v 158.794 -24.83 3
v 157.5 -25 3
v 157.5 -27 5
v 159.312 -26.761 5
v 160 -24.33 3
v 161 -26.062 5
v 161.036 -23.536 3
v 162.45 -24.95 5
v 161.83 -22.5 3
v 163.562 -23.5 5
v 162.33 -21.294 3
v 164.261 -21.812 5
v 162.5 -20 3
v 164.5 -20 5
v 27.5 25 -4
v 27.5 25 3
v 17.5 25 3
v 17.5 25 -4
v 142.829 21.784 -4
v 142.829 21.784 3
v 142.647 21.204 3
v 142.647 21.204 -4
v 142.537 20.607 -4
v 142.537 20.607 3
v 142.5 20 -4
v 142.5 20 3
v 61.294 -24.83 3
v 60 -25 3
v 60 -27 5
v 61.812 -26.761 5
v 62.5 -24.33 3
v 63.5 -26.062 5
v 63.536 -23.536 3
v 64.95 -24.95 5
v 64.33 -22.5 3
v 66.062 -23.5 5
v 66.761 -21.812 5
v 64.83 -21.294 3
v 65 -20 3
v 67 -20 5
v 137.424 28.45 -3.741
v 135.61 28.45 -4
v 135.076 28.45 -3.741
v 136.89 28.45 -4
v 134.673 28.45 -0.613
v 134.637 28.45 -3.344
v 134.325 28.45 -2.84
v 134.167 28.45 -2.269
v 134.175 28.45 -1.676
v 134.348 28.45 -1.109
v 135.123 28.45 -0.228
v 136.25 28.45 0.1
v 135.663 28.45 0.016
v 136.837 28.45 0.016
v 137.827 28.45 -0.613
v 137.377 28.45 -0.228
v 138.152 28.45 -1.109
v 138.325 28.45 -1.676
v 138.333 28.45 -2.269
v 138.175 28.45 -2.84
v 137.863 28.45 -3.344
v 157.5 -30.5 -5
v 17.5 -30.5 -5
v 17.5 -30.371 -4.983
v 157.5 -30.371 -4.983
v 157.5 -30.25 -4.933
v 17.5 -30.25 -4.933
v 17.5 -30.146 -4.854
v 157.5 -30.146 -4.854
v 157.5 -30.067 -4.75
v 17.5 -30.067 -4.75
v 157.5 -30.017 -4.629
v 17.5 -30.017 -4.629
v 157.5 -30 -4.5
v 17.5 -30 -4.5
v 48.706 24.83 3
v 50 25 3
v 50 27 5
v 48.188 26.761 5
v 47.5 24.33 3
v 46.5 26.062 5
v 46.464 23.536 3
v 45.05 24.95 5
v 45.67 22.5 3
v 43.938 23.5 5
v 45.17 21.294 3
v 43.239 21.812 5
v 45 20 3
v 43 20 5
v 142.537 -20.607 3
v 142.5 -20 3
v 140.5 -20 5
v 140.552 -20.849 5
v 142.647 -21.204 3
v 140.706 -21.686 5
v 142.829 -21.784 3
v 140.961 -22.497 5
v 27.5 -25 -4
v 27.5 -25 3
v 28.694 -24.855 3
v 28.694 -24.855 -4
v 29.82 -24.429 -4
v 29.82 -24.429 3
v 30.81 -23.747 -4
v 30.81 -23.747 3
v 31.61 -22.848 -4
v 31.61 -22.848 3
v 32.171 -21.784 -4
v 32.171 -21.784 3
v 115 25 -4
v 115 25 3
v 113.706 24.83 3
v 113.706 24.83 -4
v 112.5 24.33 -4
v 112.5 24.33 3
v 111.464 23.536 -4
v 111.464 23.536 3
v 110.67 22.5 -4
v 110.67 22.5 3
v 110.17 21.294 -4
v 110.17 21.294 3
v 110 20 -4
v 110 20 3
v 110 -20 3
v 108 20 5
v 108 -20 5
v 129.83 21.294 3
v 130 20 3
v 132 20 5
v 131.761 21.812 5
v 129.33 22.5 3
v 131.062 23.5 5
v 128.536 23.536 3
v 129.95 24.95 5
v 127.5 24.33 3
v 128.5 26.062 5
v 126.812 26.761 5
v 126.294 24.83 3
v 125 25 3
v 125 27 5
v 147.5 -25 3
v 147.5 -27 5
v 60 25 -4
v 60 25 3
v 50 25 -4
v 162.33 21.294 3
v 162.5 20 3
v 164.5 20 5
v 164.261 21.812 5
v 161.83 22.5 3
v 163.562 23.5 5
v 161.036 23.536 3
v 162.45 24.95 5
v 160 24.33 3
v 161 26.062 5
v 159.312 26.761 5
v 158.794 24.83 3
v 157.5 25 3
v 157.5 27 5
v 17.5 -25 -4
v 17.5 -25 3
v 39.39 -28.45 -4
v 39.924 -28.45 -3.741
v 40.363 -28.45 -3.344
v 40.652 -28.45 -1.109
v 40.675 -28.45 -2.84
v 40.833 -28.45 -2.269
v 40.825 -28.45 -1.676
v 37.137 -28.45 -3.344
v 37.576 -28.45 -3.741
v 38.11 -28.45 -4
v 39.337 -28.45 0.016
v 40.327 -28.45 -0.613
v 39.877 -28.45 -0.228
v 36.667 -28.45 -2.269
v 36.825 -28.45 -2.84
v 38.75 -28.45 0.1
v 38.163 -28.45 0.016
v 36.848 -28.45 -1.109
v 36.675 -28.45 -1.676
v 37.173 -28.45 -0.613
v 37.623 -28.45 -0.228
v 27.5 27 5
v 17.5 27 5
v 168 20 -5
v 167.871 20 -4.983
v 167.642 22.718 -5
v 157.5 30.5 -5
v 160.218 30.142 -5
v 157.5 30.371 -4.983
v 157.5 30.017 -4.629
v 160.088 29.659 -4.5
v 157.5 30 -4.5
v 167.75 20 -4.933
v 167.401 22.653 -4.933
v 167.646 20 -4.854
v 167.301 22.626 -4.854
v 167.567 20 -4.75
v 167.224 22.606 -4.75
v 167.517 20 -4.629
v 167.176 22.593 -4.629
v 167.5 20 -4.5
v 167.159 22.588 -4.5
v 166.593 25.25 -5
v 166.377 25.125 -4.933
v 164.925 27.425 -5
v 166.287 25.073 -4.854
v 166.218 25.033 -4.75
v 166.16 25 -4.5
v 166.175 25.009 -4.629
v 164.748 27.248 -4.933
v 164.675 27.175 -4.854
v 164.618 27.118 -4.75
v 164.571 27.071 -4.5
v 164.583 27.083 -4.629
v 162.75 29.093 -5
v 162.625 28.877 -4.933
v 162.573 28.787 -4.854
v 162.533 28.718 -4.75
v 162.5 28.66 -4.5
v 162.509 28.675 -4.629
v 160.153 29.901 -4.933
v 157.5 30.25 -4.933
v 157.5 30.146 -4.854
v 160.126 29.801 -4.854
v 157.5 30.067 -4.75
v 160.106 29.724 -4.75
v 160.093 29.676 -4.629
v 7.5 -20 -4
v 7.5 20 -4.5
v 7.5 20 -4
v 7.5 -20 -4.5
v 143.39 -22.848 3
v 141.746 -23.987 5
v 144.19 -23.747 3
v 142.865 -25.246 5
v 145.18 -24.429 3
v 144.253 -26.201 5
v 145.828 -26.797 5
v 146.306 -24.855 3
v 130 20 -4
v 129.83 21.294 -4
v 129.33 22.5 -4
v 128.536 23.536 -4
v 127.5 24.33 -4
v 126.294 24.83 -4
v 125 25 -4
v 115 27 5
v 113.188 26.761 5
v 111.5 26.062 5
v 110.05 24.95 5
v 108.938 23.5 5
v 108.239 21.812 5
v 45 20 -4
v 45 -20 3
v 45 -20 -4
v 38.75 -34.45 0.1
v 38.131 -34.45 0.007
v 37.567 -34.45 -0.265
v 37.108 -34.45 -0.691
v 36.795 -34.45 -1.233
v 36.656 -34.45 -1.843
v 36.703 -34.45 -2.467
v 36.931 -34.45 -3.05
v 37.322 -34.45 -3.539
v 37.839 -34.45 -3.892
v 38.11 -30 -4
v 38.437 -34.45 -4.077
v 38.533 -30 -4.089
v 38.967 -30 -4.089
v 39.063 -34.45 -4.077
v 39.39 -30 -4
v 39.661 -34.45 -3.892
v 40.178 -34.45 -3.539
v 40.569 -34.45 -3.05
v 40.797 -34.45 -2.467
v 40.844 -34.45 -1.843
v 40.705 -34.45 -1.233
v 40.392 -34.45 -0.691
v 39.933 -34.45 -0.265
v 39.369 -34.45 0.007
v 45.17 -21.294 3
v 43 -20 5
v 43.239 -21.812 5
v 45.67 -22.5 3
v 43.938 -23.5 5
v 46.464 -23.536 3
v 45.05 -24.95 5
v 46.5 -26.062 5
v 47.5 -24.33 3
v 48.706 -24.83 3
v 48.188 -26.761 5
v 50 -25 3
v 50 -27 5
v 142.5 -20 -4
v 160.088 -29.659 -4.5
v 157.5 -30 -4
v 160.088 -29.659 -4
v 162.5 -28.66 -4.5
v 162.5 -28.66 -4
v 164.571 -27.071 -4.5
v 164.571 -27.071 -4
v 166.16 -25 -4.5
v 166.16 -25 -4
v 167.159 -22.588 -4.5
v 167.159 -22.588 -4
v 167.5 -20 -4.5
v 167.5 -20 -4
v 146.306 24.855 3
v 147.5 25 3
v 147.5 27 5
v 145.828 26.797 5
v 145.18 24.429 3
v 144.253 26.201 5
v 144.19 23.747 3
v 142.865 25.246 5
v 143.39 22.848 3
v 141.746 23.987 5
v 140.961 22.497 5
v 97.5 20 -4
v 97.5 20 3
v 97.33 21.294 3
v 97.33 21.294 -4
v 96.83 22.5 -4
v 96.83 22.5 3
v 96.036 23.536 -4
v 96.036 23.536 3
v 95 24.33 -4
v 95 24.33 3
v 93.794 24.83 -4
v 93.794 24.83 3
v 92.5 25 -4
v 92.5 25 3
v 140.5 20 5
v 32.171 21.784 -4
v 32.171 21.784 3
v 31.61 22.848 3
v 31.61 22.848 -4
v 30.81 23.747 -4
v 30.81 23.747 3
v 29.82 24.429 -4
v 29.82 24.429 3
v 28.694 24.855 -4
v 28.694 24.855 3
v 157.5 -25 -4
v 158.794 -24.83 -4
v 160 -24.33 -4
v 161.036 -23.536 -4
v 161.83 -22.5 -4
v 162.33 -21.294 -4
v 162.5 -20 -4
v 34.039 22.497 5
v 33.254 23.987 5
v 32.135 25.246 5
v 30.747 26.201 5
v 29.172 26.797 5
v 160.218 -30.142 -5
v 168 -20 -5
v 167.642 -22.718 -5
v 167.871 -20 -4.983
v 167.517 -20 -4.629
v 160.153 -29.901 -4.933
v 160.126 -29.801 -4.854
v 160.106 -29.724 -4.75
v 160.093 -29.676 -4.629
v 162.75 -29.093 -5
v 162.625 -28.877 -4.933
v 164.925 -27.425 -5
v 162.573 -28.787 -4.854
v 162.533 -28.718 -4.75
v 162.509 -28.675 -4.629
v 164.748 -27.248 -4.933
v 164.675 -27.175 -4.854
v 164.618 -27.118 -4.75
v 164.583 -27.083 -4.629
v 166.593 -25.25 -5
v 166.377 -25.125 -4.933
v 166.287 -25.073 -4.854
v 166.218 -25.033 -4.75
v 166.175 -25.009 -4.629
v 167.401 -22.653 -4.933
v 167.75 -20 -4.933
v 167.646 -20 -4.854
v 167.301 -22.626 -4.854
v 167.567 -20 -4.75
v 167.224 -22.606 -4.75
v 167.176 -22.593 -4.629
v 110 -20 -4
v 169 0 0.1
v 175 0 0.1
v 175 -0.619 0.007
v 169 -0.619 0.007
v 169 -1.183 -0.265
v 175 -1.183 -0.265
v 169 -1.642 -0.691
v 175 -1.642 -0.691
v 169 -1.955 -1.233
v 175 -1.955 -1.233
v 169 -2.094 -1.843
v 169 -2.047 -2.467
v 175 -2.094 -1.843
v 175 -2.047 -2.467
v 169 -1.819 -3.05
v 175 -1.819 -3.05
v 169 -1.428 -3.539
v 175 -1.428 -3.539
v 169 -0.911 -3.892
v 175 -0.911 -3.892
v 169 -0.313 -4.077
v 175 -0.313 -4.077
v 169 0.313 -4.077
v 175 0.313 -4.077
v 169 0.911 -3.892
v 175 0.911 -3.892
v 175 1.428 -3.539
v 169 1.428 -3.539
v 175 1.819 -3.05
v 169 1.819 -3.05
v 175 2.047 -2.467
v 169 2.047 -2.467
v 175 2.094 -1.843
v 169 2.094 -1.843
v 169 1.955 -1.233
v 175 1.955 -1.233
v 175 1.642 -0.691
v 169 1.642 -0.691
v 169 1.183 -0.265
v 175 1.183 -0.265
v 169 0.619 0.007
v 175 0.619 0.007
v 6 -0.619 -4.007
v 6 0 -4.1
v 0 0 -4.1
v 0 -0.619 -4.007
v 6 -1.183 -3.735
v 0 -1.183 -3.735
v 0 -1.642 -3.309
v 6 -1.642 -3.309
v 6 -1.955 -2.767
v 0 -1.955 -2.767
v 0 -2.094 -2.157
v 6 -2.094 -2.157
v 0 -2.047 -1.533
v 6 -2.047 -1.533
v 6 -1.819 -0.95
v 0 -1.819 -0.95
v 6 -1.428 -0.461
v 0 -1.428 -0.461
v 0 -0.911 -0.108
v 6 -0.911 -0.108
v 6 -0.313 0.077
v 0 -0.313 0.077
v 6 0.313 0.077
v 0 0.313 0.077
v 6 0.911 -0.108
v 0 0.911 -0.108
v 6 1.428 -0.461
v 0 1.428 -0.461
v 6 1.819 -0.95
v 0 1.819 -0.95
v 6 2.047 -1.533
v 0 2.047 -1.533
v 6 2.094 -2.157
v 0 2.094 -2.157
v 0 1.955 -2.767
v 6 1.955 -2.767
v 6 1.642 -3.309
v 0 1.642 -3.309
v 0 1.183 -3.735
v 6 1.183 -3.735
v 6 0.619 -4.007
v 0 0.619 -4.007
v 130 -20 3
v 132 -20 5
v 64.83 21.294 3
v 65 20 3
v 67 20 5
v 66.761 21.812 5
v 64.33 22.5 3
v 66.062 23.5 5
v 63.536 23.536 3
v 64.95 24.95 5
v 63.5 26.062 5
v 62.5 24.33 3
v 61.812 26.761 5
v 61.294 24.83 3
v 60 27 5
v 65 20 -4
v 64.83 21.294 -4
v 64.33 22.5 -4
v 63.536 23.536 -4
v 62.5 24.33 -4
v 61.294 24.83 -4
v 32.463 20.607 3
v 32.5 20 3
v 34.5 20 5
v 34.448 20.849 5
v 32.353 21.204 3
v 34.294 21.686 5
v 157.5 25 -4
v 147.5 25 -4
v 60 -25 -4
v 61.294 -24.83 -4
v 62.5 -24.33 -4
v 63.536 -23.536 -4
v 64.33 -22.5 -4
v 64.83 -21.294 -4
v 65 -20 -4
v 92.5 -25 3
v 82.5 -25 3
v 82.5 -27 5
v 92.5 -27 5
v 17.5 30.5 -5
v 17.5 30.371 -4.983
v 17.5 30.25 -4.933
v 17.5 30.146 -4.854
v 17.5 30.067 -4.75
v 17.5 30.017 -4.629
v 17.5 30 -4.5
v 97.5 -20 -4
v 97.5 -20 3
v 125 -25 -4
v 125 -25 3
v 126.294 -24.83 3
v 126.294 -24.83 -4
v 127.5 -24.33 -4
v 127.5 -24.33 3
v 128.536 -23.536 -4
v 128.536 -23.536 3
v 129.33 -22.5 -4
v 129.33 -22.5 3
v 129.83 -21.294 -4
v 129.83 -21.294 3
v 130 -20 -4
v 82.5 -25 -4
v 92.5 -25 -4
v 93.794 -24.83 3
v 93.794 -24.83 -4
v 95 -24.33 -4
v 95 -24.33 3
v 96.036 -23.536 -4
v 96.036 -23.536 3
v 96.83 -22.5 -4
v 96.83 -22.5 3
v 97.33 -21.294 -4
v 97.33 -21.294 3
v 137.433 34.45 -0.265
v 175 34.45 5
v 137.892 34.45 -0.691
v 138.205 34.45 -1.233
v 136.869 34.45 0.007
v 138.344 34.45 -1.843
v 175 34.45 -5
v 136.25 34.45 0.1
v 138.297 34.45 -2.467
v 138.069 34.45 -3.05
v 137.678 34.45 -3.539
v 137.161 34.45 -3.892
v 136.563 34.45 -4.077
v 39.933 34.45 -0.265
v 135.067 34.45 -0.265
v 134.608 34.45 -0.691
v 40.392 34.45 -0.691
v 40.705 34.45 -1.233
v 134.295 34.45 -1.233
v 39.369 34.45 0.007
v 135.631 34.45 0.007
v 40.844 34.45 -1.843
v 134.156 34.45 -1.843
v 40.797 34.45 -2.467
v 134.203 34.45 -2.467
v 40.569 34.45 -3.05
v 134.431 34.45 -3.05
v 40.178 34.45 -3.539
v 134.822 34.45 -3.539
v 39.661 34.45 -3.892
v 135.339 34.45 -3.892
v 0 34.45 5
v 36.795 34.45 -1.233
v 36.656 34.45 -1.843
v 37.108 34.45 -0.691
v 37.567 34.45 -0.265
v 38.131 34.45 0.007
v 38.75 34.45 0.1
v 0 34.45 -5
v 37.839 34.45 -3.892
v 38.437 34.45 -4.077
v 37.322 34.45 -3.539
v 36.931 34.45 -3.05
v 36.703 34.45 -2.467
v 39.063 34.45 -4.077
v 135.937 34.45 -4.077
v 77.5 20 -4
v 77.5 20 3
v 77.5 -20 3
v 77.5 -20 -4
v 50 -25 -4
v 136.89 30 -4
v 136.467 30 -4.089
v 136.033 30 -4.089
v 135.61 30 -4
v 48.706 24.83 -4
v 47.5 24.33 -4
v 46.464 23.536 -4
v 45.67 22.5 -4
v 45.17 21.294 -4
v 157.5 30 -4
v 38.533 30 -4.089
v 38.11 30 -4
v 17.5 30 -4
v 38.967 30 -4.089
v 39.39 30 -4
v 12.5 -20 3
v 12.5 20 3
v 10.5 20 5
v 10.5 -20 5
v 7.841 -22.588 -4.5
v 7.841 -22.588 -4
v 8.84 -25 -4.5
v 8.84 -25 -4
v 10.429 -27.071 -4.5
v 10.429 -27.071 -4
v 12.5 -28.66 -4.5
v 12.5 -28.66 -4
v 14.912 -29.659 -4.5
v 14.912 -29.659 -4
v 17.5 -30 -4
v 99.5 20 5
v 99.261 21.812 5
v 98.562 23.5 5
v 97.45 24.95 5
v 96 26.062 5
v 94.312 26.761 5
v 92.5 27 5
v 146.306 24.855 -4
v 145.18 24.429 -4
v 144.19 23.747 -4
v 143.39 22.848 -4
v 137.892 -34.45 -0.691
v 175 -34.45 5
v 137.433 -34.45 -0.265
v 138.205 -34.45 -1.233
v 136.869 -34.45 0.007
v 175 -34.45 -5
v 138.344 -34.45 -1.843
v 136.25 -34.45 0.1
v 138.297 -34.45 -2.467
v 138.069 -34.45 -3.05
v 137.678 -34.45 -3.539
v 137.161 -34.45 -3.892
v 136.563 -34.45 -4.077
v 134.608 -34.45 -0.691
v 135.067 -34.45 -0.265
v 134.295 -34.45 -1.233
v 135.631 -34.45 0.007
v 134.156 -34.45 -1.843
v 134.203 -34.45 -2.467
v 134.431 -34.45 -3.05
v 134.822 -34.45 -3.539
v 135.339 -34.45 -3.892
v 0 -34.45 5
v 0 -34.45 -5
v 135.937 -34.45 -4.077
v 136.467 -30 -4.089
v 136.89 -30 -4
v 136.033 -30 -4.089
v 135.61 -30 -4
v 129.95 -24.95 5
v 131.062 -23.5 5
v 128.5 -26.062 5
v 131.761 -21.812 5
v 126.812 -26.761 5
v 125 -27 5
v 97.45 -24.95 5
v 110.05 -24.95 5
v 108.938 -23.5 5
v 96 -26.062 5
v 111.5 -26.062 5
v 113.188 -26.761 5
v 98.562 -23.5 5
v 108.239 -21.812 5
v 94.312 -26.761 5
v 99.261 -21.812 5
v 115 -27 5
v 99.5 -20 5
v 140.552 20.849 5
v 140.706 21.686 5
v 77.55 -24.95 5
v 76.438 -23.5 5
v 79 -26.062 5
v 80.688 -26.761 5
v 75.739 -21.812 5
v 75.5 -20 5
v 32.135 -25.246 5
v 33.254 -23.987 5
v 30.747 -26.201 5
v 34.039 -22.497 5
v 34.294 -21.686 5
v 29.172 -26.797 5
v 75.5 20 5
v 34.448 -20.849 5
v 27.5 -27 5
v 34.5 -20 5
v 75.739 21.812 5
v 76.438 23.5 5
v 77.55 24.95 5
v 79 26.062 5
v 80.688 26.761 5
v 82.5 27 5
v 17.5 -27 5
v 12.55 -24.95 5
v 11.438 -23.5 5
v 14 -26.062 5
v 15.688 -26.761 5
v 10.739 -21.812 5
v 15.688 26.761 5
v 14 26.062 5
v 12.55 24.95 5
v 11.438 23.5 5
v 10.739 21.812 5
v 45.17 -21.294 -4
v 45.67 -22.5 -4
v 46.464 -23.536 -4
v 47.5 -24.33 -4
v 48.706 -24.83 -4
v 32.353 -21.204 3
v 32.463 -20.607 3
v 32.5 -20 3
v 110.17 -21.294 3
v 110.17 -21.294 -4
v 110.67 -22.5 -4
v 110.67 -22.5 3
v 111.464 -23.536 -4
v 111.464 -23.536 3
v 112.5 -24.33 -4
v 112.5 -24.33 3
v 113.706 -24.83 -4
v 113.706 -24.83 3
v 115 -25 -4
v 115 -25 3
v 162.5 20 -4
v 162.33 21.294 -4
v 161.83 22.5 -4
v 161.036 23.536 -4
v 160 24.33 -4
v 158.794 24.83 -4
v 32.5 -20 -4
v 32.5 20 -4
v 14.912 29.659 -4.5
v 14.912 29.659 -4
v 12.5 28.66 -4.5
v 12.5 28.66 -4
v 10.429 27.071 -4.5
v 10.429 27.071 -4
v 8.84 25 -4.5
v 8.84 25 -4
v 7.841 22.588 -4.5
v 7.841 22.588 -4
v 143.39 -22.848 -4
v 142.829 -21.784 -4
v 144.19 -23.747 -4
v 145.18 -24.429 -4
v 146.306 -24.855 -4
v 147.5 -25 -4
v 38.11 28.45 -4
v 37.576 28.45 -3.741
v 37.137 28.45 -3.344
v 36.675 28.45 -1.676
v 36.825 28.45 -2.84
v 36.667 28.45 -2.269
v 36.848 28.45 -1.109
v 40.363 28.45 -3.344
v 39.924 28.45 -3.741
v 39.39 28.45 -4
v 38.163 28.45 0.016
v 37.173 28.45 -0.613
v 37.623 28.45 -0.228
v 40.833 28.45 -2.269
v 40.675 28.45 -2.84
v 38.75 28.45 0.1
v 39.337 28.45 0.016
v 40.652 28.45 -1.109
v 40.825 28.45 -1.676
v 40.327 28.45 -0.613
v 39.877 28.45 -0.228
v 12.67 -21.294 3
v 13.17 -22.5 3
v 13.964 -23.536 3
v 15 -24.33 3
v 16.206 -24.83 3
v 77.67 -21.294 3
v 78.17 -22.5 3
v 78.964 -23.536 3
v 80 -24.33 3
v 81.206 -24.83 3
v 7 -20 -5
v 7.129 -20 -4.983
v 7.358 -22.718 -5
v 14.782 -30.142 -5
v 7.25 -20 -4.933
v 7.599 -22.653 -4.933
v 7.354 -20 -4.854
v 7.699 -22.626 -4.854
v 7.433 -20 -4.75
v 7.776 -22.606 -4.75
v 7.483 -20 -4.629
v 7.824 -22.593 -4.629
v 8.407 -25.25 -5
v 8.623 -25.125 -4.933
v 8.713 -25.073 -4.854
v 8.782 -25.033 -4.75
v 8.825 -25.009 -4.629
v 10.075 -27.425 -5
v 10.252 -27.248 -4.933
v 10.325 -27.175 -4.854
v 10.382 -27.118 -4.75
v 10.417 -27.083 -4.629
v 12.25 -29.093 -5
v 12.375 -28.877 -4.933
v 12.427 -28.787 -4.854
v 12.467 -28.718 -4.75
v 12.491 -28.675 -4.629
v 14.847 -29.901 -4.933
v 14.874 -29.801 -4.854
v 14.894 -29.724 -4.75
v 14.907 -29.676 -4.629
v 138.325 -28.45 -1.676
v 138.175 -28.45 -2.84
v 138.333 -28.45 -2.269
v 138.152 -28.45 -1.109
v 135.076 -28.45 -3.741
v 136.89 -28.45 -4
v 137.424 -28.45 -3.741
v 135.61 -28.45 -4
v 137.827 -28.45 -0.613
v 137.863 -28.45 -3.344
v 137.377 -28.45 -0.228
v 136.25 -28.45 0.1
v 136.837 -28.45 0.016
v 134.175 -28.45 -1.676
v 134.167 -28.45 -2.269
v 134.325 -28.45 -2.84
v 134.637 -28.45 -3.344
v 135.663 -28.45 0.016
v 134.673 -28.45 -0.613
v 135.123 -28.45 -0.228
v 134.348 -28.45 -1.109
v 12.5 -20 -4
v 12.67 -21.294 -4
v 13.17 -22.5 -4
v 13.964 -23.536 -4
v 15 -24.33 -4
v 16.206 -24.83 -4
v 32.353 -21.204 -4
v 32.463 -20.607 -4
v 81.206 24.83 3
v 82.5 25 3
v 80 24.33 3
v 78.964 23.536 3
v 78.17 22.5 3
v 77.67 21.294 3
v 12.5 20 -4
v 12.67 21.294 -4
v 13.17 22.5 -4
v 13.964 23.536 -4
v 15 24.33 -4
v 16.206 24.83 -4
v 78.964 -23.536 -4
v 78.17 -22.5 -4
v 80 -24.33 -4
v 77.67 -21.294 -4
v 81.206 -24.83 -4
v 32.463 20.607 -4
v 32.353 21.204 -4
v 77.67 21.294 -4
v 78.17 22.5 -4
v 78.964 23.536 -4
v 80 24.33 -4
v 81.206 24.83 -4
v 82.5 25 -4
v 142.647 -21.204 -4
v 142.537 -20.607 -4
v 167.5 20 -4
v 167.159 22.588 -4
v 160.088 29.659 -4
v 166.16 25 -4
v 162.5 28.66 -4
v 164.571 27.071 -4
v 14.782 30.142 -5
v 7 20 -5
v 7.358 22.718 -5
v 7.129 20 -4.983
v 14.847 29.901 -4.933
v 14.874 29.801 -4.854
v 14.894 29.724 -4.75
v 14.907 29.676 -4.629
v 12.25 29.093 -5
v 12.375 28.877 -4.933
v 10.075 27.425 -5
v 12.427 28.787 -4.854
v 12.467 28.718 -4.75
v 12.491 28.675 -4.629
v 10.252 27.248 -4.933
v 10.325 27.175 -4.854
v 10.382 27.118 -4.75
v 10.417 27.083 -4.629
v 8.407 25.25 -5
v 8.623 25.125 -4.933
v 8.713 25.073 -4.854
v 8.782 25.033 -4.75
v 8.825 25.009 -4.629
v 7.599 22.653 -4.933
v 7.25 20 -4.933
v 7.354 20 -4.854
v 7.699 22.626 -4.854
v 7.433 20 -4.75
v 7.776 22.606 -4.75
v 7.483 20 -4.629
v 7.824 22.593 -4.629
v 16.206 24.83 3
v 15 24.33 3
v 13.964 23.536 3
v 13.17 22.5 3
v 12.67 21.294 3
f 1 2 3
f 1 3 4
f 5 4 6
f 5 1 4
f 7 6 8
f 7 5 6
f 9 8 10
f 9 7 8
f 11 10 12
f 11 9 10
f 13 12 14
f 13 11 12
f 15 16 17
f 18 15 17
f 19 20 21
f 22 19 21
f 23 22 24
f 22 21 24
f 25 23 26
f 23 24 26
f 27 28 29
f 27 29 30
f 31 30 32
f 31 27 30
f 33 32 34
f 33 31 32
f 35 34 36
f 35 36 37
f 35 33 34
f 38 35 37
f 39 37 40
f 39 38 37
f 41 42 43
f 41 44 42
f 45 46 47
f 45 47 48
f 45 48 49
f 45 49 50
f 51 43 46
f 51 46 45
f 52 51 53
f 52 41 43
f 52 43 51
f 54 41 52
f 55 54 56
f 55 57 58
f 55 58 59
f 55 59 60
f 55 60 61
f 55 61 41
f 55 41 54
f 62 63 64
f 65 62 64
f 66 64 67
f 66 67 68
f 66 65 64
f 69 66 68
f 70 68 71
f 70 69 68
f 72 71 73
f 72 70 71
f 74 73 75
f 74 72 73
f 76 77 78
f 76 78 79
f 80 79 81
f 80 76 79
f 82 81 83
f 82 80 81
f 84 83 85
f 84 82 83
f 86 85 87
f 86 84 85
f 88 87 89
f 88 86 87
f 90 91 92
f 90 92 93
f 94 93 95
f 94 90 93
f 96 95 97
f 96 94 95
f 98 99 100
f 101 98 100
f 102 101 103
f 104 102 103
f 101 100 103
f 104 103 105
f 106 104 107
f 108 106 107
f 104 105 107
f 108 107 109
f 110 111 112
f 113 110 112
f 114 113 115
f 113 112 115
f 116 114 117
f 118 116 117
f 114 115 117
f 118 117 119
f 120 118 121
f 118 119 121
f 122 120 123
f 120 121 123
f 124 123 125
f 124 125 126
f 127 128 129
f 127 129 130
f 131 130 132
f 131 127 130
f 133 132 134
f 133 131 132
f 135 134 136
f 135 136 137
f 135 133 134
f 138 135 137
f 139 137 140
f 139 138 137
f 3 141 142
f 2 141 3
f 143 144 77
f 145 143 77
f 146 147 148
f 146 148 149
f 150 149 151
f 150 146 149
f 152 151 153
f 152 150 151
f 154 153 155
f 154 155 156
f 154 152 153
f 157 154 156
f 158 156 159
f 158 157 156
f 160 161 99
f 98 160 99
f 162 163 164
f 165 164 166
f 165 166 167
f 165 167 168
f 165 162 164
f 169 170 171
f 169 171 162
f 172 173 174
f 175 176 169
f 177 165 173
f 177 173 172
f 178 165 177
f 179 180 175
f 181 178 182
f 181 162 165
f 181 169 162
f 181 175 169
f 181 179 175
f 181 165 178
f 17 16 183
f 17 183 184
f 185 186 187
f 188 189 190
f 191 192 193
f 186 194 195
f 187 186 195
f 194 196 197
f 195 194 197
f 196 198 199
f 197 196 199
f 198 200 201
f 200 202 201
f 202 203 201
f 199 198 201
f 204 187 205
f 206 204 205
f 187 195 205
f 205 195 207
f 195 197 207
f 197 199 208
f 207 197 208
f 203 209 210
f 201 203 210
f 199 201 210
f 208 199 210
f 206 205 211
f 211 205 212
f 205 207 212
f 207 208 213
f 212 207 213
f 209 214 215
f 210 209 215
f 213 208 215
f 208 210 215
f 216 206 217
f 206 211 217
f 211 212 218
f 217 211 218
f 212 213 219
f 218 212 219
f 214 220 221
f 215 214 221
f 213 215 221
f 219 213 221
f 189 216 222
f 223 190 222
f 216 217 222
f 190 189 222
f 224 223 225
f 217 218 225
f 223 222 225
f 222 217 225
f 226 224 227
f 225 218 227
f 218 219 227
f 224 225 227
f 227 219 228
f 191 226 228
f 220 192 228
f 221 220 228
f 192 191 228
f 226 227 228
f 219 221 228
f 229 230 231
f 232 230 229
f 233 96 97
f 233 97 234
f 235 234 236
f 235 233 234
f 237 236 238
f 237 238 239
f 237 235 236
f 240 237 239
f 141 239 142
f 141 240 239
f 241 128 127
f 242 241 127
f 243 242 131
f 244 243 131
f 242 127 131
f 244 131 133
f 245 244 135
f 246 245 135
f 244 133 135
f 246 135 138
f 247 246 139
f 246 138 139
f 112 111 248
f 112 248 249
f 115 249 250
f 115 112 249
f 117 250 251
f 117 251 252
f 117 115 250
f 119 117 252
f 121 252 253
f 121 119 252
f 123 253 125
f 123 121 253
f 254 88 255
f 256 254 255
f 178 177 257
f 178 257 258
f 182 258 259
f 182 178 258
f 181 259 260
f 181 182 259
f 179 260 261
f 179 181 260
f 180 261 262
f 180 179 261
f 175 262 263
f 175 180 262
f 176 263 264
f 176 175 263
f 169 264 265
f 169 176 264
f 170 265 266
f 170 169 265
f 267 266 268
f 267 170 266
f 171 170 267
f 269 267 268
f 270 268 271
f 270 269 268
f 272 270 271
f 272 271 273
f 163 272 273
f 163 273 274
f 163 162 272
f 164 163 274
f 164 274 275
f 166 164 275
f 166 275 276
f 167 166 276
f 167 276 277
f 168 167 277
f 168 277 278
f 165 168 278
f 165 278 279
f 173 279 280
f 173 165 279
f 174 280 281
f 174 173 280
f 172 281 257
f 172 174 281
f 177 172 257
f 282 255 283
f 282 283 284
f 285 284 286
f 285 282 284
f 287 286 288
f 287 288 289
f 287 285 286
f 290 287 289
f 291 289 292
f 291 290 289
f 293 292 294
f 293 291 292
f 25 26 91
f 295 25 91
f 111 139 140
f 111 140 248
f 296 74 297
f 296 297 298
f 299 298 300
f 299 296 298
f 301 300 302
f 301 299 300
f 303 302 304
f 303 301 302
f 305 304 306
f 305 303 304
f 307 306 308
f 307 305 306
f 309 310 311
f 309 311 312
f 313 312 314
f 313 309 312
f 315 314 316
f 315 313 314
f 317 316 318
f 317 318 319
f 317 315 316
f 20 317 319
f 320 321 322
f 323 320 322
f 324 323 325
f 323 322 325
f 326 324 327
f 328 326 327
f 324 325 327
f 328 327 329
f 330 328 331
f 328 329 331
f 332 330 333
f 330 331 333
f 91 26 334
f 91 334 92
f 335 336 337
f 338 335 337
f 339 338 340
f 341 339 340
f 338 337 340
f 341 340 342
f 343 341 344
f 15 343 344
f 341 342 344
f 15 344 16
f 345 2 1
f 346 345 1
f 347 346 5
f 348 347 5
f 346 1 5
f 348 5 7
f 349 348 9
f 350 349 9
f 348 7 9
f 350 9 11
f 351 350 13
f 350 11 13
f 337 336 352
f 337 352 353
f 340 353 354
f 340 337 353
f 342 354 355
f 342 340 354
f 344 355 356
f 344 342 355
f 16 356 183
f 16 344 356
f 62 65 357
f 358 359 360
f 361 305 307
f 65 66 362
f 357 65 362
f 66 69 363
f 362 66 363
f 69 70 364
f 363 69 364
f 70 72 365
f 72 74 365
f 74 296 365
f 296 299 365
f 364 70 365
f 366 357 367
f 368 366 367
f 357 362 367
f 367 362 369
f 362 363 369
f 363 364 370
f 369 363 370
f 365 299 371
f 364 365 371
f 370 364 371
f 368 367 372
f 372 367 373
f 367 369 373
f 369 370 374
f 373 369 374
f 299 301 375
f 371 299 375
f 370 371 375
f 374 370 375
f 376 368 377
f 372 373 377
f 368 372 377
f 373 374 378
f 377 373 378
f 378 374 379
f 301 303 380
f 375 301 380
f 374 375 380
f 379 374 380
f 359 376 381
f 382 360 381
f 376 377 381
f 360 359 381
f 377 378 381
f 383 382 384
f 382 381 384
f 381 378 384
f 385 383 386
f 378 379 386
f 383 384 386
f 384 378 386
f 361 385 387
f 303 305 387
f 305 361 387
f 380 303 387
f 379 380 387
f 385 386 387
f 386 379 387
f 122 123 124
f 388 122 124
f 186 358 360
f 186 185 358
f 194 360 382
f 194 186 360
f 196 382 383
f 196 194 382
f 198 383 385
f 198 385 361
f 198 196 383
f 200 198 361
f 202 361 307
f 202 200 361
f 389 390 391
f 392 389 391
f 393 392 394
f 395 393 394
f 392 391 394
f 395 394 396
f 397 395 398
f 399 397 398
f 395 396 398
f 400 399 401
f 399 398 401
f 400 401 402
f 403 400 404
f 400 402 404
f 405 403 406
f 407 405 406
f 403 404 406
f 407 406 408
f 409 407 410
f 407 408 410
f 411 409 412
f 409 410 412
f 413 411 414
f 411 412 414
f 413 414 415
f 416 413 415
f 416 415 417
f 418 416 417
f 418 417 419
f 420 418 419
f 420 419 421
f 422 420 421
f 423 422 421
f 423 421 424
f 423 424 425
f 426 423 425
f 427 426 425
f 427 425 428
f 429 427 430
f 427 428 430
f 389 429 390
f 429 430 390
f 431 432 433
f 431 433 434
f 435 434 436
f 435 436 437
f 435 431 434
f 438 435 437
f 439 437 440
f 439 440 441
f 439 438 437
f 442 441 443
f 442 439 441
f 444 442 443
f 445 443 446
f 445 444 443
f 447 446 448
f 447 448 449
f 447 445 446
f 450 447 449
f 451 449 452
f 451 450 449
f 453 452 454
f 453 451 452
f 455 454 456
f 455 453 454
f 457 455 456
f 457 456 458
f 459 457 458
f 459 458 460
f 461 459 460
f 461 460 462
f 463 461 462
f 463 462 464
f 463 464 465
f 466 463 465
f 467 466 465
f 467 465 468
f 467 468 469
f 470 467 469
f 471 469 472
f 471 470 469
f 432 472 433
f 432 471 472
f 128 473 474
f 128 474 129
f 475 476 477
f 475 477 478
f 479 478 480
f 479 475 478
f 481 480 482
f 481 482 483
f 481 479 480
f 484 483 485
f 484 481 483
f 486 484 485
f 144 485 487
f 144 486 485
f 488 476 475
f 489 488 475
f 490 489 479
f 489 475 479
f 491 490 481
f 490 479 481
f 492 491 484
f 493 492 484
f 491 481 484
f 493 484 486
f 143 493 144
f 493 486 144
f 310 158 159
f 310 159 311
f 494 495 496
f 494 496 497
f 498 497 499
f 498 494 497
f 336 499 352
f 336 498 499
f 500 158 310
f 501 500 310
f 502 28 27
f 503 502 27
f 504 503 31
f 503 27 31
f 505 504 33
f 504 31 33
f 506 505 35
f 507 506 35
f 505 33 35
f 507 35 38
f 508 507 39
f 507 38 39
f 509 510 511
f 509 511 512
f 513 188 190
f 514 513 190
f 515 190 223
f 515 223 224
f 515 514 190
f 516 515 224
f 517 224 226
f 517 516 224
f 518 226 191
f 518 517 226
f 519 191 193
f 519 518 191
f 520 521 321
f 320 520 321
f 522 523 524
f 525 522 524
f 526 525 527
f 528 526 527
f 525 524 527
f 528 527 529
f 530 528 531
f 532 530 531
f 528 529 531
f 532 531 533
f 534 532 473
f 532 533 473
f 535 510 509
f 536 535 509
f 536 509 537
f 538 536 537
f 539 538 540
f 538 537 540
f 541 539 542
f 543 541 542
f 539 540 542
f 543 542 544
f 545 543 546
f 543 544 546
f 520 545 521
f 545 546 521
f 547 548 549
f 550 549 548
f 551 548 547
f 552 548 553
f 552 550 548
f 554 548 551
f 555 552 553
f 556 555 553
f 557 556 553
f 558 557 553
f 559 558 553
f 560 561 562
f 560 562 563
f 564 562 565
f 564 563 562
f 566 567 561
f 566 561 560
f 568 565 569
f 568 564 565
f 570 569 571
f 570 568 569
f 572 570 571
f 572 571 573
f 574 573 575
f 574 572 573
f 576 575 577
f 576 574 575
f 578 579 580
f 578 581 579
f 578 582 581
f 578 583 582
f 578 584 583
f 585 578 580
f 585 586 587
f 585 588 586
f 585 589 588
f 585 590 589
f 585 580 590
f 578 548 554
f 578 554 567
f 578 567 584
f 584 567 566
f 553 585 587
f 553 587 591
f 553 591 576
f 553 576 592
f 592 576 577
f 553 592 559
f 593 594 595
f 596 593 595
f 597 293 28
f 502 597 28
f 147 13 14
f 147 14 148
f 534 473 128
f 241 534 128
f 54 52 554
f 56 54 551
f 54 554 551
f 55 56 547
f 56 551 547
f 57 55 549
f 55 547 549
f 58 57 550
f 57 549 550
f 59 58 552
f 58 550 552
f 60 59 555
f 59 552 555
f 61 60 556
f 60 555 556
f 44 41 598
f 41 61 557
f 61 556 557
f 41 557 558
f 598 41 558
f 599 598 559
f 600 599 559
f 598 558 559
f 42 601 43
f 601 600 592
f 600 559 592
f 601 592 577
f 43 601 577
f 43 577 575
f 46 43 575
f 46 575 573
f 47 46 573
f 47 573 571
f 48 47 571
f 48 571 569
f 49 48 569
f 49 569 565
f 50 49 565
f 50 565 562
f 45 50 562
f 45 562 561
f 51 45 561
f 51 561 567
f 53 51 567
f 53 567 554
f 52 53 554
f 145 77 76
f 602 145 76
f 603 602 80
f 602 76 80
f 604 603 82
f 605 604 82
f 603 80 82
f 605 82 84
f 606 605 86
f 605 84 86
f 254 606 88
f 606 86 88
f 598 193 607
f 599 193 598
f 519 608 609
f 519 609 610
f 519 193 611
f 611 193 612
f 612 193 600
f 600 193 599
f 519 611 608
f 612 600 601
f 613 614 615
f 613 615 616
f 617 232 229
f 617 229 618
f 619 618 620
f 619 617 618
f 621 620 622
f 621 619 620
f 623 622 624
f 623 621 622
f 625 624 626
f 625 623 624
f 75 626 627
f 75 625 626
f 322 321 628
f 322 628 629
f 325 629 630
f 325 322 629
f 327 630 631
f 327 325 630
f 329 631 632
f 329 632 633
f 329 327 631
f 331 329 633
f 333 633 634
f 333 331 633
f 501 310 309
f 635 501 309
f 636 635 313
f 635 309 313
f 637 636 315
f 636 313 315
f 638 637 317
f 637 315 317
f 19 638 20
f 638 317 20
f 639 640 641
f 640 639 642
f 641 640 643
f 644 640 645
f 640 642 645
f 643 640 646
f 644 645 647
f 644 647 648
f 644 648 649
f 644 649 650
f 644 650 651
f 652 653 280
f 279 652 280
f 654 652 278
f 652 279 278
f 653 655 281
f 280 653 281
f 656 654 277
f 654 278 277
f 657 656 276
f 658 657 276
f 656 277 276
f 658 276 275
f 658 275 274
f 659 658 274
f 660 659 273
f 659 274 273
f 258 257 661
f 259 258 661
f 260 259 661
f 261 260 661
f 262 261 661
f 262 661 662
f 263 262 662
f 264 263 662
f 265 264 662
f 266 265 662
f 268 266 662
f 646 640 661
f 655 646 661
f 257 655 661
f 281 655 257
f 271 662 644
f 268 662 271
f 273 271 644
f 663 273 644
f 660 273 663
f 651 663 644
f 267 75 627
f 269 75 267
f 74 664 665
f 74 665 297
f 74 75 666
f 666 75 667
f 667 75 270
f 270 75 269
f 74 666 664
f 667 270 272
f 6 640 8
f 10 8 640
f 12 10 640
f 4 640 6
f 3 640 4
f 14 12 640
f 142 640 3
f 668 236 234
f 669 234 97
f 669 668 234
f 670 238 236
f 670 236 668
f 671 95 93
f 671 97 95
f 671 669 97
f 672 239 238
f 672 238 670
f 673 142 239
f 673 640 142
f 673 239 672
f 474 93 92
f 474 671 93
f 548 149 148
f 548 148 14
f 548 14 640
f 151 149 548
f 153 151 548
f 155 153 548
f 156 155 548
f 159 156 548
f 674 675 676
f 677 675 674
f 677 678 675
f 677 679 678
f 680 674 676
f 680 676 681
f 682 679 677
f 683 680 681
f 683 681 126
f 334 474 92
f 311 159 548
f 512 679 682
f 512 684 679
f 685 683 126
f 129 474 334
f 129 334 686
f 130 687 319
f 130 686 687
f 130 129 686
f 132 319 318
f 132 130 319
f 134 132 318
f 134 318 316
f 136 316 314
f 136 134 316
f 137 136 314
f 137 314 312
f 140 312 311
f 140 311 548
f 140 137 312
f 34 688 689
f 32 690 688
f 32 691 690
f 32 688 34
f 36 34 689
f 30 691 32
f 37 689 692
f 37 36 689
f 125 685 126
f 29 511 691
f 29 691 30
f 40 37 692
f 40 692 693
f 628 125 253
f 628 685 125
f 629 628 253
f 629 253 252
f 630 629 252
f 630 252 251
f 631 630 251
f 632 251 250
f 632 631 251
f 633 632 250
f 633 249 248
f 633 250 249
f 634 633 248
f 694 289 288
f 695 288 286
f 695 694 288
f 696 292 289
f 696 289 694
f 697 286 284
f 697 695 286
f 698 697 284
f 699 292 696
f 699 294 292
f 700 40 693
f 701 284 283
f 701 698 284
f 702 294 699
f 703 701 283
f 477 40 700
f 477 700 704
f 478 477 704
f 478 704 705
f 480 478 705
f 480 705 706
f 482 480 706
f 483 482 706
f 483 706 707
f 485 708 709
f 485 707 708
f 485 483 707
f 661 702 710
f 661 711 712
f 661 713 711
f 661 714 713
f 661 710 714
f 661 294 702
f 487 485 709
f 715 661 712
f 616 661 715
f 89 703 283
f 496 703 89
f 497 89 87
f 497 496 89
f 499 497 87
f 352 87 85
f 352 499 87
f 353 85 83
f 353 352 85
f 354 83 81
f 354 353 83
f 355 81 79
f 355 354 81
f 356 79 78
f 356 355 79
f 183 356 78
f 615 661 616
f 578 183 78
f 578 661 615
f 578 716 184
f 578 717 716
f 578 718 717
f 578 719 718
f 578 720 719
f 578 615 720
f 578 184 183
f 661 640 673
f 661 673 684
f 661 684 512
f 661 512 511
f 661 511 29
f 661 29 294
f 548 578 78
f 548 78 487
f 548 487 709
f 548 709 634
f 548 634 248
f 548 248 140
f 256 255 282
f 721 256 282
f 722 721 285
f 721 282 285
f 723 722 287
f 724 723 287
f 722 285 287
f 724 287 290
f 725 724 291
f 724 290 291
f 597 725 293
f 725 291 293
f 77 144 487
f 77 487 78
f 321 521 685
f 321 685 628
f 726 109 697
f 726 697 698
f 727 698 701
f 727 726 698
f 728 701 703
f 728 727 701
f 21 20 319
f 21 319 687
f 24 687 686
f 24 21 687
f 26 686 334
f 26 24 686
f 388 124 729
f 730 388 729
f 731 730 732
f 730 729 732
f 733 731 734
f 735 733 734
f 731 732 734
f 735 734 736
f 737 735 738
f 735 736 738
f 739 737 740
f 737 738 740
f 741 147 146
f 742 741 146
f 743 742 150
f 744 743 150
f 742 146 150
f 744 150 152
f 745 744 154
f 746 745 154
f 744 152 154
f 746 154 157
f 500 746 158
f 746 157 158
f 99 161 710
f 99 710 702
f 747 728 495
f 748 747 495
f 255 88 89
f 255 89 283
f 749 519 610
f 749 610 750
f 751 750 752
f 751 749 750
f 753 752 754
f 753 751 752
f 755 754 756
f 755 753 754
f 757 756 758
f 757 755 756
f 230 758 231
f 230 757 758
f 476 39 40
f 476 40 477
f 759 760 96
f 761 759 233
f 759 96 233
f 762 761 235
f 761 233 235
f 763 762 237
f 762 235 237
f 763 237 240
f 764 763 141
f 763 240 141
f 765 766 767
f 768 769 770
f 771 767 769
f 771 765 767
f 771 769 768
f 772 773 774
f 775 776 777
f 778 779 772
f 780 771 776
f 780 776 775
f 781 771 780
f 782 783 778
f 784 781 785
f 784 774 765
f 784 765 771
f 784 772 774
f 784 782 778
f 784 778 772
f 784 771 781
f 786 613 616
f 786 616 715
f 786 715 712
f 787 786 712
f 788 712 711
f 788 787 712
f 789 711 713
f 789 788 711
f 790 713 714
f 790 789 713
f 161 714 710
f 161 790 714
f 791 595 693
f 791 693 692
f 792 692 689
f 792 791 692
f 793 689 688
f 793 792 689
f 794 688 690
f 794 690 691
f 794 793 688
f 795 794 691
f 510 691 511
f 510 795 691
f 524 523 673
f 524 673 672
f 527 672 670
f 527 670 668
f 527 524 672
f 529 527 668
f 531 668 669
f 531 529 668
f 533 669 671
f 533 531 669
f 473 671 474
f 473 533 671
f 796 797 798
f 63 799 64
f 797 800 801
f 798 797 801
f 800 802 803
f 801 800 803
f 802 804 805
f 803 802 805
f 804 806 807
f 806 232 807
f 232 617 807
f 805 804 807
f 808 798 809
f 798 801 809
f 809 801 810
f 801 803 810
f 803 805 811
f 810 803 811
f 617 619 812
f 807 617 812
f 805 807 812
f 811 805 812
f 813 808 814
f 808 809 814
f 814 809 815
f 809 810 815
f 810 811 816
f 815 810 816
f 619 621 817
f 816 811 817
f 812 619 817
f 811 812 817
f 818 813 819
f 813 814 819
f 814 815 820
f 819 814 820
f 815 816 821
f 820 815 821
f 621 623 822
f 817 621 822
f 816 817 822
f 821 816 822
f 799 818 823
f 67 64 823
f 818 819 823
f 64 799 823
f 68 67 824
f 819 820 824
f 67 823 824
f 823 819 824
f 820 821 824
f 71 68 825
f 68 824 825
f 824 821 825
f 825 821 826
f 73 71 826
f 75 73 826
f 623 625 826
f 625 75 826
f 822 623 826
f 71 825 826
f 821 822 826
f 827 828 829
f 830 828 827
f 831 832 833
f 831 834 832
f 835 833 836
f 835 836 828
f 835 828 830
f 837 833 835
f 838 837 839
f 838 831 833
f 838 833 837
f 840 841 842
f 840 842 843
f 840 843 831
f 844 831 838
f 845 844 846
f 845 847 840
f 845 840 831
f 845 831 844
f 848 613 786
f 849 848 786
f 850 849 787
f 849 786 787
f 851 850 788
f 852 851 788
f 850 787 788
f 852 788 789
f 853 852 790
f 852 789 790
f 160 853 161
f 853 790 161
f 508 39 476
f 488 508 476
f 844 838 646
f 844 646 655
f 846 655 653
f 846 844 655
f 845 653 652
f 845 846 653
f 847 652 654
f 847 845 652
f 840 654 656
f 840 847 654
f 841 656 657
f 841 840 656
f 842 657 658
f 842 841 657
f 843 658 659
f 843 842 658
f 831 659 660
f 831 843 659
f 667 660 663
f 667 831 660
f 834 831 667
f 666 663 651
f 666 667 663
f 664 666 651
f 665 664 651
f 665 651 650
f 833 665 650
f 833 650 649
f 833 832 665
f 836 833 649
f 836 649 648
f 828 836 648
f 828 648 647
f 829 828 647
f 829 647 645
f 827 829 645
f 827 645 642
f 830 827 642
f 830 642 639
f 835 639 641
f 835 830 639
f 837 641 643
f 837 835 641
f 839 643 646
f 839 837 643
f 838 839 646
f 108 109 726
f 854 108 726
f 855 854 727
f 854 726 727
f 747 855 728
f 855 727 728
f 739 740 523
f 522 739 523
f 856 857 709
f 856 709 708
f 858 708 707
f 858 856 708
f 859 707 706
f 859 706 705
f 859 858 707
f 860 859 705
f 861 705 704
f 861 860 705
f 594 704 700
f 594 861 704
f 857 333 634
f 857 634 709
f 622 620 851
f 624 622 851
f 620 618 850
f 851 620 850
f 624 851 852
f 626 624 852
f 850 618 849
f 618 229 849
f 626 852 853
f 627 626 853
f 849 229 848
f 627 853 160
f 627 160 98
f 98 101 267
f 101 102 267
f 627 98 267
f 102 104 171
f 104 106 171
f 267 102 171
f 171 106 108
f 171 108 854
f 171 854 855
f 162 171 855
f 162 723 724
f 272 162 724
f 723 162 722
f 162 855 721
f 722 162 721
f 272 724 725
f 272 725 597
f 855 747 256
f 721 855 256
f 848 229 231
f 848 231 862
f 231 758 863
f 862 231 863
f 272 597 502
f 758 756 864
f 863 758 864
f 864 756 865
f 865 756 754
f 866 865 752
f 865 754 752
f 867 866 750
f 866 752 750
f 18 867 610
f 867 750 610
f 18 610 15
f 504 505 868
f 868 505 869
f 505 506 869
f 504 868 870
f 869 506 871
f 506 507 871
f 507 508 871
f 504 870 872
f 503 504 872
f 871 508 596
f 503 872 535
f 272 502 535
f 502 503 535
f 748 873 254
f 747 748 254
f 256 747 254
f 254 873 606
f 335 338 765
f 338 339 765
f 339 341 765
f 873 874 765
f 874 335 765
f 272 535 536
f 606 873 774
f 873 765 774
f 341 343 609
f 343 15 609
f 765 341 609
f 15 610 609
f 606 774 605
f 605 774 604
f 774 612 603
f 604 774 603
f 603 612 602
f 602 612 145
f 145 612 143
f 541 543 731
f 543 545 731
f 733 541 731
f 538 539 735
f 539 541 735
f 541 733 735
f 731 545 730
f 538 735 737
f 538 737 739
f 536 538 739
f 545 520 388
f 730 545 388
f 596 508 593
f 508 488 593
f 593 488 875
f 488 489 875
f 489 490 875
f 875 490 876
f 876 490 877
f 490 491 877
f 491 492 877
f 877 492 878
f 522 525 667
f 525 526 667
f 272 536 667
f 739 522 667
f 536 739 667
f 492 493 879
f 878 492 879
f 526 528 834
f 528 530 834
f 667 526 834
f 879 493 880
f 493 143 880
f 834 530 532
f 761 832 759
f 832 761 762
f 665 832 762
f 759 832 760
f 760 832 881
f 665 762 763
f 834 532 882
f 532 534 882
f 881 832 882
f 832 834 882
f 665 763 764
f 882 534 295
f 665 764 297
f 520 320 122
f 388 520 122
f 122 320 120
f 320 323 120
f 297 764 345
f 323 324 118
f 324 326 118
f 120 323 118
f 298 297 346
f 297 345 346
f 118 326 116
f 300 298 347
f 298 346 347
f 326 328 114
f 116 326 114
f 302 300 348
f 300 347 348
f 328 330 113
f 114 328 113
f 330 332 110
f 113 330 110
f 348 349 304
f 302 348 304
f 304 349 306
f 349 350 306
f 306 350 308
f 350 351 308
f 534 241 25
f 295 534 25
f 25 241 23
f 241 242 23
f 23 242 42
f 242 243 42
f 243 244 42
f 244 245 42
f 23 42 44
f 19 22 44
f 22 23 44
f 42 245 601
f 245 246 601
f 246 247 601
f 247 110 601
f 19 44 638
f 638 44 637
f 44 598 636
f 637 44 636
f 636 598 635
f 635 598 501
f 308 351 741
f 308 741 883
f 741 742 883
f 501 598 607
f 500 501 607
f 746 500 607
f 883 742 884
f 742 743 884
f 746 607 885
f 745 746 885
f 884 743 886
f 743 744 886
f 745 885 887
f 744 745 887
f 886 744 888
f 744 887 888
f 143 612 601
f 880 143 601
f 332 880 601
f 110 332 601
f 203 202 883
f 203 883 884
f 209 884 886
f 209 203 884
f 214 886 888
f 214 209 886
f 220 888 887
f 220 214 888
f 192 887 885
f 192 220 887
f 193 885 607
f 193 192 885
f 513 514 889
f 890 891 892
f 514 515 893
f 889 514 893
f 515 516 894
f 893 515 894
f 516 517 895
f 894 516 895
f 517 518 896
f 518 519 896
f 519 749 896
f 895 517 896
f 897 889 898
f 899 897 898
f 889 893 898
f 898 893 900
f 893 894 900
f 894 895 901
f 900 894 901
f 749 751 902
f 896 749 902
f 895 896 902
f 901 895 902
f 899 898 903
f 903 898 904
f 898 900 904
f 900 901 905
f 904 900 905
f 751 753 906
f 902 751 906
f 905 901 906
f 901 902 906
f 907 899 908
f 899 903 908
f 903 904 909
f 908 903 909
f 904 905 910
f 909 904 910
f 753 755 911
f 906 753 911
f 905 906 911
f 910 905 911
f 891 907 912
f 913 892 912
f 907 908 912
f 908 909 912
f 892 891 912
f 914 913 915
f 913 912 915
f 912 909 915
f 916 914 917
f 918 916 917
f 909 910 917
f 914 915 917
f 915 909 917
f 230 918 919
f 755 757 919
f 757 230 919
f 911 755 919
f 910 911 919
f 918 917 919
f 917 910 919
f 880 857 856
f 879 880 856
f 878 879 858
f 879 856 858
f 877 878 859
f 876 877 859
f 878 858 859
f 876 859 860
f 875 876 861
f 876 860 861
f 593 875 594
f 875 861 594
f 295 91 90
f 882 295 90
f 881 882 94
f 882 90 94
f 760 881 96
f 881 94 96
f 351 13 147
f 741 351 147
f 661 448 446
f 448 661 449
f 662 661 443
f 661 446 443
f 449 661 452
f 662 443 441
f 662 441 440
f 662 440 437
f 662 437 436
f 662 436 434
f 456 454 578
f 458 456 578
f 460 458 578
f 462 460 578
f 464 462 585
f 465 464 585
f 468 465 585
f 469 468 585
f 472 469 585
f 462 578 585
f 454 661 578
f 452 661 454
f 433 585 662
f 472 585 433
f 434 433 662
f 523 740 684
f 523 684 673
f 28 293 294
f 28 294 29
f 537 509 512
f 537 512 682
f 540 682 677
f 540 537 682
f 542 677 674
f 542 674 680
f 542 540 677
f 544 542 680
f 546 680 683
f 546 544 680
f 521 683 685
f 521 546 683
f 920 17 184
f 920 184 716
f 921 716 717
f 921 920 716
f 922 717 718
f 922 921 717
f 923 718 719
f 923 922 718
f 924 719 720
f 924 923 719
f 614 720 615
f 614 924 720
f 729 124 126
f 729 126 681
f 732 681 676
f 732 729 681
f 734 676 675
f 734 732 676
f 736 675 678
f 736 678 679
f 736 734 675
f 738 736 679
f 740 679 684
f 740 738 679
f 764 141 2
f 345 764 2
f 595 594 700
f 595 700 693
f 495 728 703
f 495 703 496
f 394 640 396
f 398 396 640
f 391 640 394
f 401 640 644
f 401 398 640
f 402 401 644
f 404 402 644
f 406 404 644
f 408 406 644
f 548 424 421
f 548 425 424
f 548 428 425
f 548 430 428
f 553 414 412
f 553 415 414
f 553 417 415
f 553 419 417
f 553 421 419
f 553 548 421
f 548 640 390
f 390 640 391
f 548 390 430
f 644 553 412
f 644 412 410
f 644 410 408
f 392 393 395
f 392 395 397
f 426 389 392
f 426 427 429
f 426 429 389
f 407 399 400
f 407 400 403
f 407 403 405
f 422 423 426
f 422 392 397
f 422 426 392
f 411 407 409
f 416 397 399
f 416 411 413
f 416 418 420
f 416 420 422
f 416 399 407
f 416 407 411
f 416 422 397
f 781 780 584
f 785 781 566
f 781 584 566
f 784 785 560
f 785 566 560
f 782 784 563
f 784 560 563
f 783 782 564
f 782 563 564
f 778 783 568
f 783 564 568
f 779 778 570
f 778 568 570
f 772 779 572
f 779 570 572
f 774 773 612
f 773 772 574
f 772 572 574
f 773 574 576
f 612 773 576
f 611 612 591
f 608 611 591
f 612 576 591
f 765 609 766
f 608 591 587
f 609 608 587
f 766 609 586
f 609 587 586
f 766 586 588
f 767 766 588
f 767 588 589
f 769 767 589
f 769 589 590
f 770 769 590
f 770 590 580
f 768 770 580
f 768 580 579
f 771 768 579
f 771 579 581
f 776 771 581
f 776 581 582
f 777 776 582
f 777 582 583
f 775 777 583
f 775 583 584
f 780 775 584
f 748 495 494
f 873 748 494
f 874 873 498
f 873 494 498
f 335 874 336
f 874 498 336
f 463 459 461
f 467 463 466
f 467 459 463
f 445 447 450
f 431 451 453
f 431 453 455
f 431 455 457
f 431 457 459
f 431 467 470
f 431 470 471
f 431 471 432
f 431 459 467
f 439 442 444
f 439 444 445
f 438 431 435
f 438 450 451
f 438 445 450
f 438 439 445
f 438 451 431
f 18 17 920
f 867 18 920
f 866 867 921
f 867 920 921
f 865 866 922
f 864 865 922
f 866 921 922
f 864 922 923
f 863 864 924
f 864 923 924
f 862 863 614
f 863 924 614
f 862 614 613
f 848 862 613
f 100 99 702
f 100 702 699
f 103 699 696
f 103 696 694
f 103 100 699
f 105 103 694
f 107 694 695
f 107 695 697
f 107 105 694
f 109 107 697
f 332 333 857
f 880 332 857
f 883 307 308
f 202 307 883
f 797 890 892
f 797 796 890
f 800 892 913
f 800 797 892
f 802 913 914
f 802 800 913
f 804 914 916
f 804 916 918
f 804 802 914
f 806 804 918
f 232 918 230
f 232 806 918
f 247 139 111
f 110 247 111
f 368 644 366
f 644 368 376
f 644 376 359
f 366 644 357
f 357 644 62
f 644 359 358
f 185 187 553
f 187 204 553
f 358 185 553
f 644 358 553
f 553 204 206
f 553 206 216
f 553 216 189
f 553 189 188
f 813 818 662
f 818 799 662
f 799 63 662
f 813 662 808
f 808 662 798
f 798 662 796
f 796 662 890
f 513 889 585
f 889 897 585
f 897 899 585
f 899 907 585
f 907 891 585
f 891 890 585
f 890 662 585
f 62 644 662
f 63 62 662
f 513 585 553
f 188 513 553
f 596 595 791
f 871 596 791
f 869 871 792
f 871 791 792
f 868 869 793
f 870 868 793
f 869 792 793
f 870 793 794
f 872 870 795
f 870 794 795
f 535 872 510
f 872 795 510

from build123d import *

# Parameters (mm, degrees)
SKETCH_1_W           = 10
SKETCH_1_H           = 68.9
EXTRUDE_1_DEPTH      = 175
CUT_EXTRUDE_1_DEPTH  = 10
CHAMFER_1_SIZE       = 2
SKETCH_5_R           = 2.1
CUT_EXTRUDE_4_DEPTH  = 6
CUT_EXTRUDE_START    = -6
SKETCH_8_R           = 2.1
CUT_EXTRUDE_7_DEPTH  = 6
CUT_EXTRUDE_8_DEPTH  = 6
SKETCH_10_R          = 2.1
CUT_EXTRUDE_10_DEPTH = 6
CUT_EXTRUDE_11_DEPTH = 1
FILLET_1_R           = 0.5


with BuildPart() as part:
    # 草图1 → 凸台-拉伸1 (new body)
    with BuildSketch(Plane(origin=(0, 0, 0), x_dir=(0, 0, -1), z_dir=(1, 0, 0))):
        Rectangle(SKETCH_1_W, SKETCH_1_H)
    extrude(amount=EXTRUDE_1_DEPTH)

    # 草图2 → 切除-拉伸1 (cut)
    with BuildSketch(Plane.XY.offset(5)):
        Polygon((65, 8.858571429), (45, 16.732857143), (45, -16.732857143), (65, -8.858571429), align=None)
        with BuildLine():
            Line((45, 20), (45, 16.732857143))
            Line((45, 16.732857143), (65, 8.858571429))
            Line((65, 8.858571429), (65, 20))
            ThreePointArc((65, 20), (63.535533906, 23.535533906), (60, 25))
            Line((60, 25), (50, 25))
            ThreePointArc((50, 25), (46.464466094, 23.535533906), (45, 20))
        make_face()
        with BuildLine():
            Line((65, -8.858571429), (45, -16.732857143))
            Line((45, -16.732857143), (45, -20))
            ThreePointArc((45, -20), (46.464466094, -23.535533906), (50, -25))
            Line((50, -25), (60, -25))
            ThreePointArc((60, -25), (63.535533906, -23.535533906), (65, -20))
            Line((65, -20), (65, -8.858571429))
        make_face()
        with BuildLine():
            Line((32.170968927, -21.783829948), (24.002177068, -25))
            Line((24.002177068, -25), (27.5, -25))
            ThreePointArc((27.5, -25), (30.335564341, -24.118200441), (32.170968927, -21.783829948))
        make_face()
        with BuildLine():
            Line((32.170968927, 21.783829948), (24.002177068, 25))
            Line((24.002177068, 25), (17.5, 25))
            ThreePointArc((17.5, 25), (13.964466094, 23.535533906), (12.5, 20))
            Line((12.5, 20), (12.5, -20))
            ThreePointArc((12.5, -20), (13.964466094, -23.535533906), (17.5, -25))
            Line((17.5, -25), (24.002177068, -25))
            Line((24.002177068, -25), (32.170968927, -21.783829948))
            ThreePointArc((32.170968927, -21.783829948), (32.417054232, -20.906960684), (32.5, -20))
            Line((32.5, -20), (32.5, 20))
            ThreePointArc((32.5, 20), (32.417054232, 20.906960684), (32.170968927, 21.783829948))
        make_face()
        with BuildLine():
            Line((27.5, 25), (24.002177068, 25))
            Line((24.002177068, 25), (32.170968927, 21.783829948))
            ThreePointArc((32.170968927, 21.783829948), (30.335564341, 24.118200441), (27.5, 25))
        make_face()
        with BuildLine():
            Line((87.5, 0), (97.5, 3.937142857))
            Line((97.5, 3.937142857), (97.5, 20))
            ThreePointArc((97.5, 20), (96.035533906, 23.535533906), (92.5, 25))
            Line((92.5, 25), (82.5, 25))
            ThreePointArc((82.5, 25), (78.964466094, 23.535533906), (77.5, 20))
            Line((77.5, 20), (77.5, 3.937142857))
            Line((77.5, 3.937142857), (87.5, 0))
        make_face()
        Polygon((77.5, -3.937142857), (87.5, 0), (77.5, 3.937142857), align=None)
        with BuildLine():
            Line((97.5, -3.937142857), (87.5, 0))
            Line((87.5, 0), (77.5, -3.937142857))
            Line((77.5, -3.937142857), (77.5, -20))
            ThreePointArc((77.5, -20), (78.964466094, -23.535533906), (82.5, -25))
            Line((82.5, -25), (92.5, -25))
            ThreePointArc((92.5, -25), (96.035533906, -23.535533906), (97.5, -20))
            Line((97.5, -20), (97.5, -3.937142857))
        make_face()
        Polygon((97.5, -3.937142857), (97.5, 3.937142857), (87.5, 0), align=None)
        Polygon((130, -16.732857143), (130, 16.732857143), (110, 8.858571429), (110, -8.858571429), align=None)
        with BuildLine():
            Line((130, -20), (130, -16.732857143))
            Line((130, -16.732857143), (110, -8.858571429))
            Line((110, -8.858571429), (110, -20))
            ThreePointArc((110, -20), (111.464466094, -23.535533906), (115, -25))
            Line((115, -25), (125, -25))
            ThreePointArc((125, -25), (128.535533906, -23.535533906), (130, -20))
        make_face()
        with BuildLine():
            Line((110, 8.858571429), (130, 16.732857143))
            Line((130, 16.732857143), (130, 20))
            ThreePointArc((130, 20), (128.535533906, 23.535533906), (125, 25))
            Line((125, 25), (115, 25))
            ThreePointArc((115, 25), (111.464466094, 23.535533906), (110, 20))
            Line((110, 20), (110, 8.858571429))
        make_face()
        with BuildLine():
            Line((157.5, 25), (150.997822932, 25))
            Line((150.997822932, 25), (142.829031073, 21.783829948))
            ThreePointArc((142.829031073, 21.783829948), (142.582945768, 20.906960684), (142.5, 20))
            Line((142.5, 20), (142.5, -20))
            ThreePointArc((142.5, -20), (142.582945768, -20.906960684), (142.829031073, -21.783829948))
            Line((142.829031073, -21.783829948), (150.997822932, -25))
            Line((150.997822932, -25), (157.5, -25))
            ThreePointArc((157.5, -25), (161.035533906, -23.535533906), (162.5, -20))
            Line((162.5, -20), (162.5, 20))
            ThreePointArc((162.5, 20), (161.035533906, 23.535533906), (157.5, 25))
        make_face()
        with BuildLine():
            Line((142.829031073, 21.783829948), (150.997822932, 25))
            Line((150.997822932, 25), (147.5, 25))
            ThreePointArc((147.5, 25), (144.664435659, 24.118200441), (142.829031073, 21.783829948))
        make_face()
        with BuildLine():
            Line((147.5, -25), (150.997822932, -25))
            Line((150.997822932, -25), (142.829031073, -21.783829948))
            ThreePointArc((142.829031073, -21.783829948), (144.664435659, -24.118200441), (147.5, -25))
        make_face()
    extrude(amount=-CUT_EXTRUDE_1_DEPTH, mode=Mode.SUBTRACT)

    # 倒角1
    chamfer_1_edges = [part.edges().sort_by_distance(p)[0] for p in [
        (46.464466094, 23.535533906, 5),
        (55, 25, 5),
        (63.535533906, 23.535533906, 5),
        (55, -25, 5),
        (143.964466094, -23.535533906, 5),
        (142.5, 0, 5),
        (143.964466094, 23.535533906, 5),
        (152.5, 25, 5),
        (161.035533906, 23.535533906, 5),
        (162.5, 0, 5),
        (161.035533906, -23.535533906, 5),
        (152.5, -25, 5),
        (130, 0, 5),
        (128.535533906, -23.535533906, 5),
        (111.464466094, -23.535533906, 5),
        (110, 0, 5),
        (111.464466094, 23.535533906, 5),
        (120, 25, 5),
        (128.535533906, 23.535533906, 5),
        (120, -25, 5),
        (77.5, 0, 5),
        (78.964466094, 23.535533906, 5),
        (87.5, 25, 5),
        (96.035533906, 23.535533906, 5),
        (97.5, 0, 5),
        (96.035533906, -23.535533906, 5),
        (78.964466094, -23.535533906, 5),
        (87.5, -25, 5),
        (31.035533906, -23.535533906, 5),
        (13.964466094, -23.535533906, 5),
        (12.5, 0, 5),
        (13.964466094, 23.535533906, 5),
        (22.5, 25, 5),
        (31.035533906, 23.535533906, 5),
        (32.5, 0, 5),
        (22.5, -25, 5),
        (65, 0, 5),
        (63.535533906, -23.535533906, 5),
        (46.464466094, -23.535533906, 5),
        (45, 0, 5),
    ]]
    chamfer(chamfer_1_edges, length=CHAMFER_1_SIZE)

    # 草图5 → 切除-拉伸4 (cut)
    with BuildSketch(Plane(origin=(0, 34.45, 0), x_dir=(1, 0, 0), z_dir=(0, 1, 0))):
        with Locations(Location((38.75, 2, 0), (0, 0, 270))):
            Circle(SKETCH_5_R)
        with Locations(Location((136.25, 2, 0), (0, 0, 270))):
            Circle(SKETCH_5_R)
    extrude(amount=-CUT_EXTRUDE_4_DEPTH, mode=Mode.SUBTRACT)

    # 草图8 → 切除-拉伸7 (cut)
    with BuildSketch(Plane.XZ.offset(34.45).offset(CUT_EXTRUDE_START)):
        with Locations(Location((136.25, -2, 0), (0, 0, 90))):
            Circle(SKETCH_8_R)
        with Locations(Location((38.75, -2, 0), (0, 0, 90))):
            Circle(SKETCH_8_R)
    extrude(amount=CUT_EXTRUDE_7_DEPTH, mode=Mode.SUBTRACT)

    # 草图9 → 切除-拉伸8 (cut)
    with BuildSketch(Plane(origin=(175, 0, 0), x_dir=(0, 0, -1), z_dir=(1, 0, 0))):
        with BuildLine():
            ThreePointArc((4.1, 0), (2, 2.1), (-0.1, 0))
            Line((-0.1, 0), (4.1, 0))
        make_face()
        with BuildLine():
            Line((4.1, 0), (-0.1, 0))
            ThreePointArc((-0.1, 0), (2, -2.1), (4.1, 0))
        make_face()
    extrude(amount=-CUT_EXTRUDE_8_DEPTH, mode=Mode.SUBTRACT)

    # 草图10 → 切除-拉伸10 (cut)
    with BuildSketch(Plane.ZY.offset(CUT_EXTRUDE_START)):
        with Locations(Location((-2, 0, 0), (0, 0, 180))):
            Circle(SKETCH_10_R)
    extrude(amount=CUT_EXTRUDE_10_DEPTH, mode=Mode.SUBTRACT)

    # 草图11 → 切除-拉伸11 (cut)
    with BuildSketch(Plane(origin=(0, 0, -5), x_dir=(-1, 0, 0), z_dir=(0, 0, -1))):
        with BuildLine():
            Line((-157.5, 30), (-17.5, 30))
            ThreePointArc((-17.5, 30), (-10.428932188, 27.071067812), (-7.5, 20))
            Line((-7.5, 20), (-7.5, -20))
            ThreePointArc((-7.5, -20), (-10.428932188, -27.071067812), (-17.5, -30))
            Line((-17.5, -30), (-157.5, -30))
            ThreePointArc((-157.5, -30), (-164.571067812, -27.071067812), (-167.5, -20))
            Line((-167.5, -20), (-167.5, 20))
            ThreePointArc((-167.5, 20), (-164.571067812, 27.071067812), (-157.5, 30))
        make_face()
    extrude(amount=-CUT_EXTRUDE_11_DEPTH, mode=Mode.SUBTRACT)

    # 圆角1
    fillet_1_edges = [part.edges().sort_by_distance(p)[0] for p in [
        (10.428932188, -27.071067812, -5),
        (7.5, 0, -5),
        (10.428932188, 27.071067812, -5),
        (87.5, 30, -5),
        (164.571067812, 27.071067812, -5),
        (167.5, 0, -5),
        (164.571067812, -27.071067812, -5),
        (87.5, -30, -5),
    ]]
    fillet(fillet_1_edges, radius=FILLET_1_R)


solid = part.part
